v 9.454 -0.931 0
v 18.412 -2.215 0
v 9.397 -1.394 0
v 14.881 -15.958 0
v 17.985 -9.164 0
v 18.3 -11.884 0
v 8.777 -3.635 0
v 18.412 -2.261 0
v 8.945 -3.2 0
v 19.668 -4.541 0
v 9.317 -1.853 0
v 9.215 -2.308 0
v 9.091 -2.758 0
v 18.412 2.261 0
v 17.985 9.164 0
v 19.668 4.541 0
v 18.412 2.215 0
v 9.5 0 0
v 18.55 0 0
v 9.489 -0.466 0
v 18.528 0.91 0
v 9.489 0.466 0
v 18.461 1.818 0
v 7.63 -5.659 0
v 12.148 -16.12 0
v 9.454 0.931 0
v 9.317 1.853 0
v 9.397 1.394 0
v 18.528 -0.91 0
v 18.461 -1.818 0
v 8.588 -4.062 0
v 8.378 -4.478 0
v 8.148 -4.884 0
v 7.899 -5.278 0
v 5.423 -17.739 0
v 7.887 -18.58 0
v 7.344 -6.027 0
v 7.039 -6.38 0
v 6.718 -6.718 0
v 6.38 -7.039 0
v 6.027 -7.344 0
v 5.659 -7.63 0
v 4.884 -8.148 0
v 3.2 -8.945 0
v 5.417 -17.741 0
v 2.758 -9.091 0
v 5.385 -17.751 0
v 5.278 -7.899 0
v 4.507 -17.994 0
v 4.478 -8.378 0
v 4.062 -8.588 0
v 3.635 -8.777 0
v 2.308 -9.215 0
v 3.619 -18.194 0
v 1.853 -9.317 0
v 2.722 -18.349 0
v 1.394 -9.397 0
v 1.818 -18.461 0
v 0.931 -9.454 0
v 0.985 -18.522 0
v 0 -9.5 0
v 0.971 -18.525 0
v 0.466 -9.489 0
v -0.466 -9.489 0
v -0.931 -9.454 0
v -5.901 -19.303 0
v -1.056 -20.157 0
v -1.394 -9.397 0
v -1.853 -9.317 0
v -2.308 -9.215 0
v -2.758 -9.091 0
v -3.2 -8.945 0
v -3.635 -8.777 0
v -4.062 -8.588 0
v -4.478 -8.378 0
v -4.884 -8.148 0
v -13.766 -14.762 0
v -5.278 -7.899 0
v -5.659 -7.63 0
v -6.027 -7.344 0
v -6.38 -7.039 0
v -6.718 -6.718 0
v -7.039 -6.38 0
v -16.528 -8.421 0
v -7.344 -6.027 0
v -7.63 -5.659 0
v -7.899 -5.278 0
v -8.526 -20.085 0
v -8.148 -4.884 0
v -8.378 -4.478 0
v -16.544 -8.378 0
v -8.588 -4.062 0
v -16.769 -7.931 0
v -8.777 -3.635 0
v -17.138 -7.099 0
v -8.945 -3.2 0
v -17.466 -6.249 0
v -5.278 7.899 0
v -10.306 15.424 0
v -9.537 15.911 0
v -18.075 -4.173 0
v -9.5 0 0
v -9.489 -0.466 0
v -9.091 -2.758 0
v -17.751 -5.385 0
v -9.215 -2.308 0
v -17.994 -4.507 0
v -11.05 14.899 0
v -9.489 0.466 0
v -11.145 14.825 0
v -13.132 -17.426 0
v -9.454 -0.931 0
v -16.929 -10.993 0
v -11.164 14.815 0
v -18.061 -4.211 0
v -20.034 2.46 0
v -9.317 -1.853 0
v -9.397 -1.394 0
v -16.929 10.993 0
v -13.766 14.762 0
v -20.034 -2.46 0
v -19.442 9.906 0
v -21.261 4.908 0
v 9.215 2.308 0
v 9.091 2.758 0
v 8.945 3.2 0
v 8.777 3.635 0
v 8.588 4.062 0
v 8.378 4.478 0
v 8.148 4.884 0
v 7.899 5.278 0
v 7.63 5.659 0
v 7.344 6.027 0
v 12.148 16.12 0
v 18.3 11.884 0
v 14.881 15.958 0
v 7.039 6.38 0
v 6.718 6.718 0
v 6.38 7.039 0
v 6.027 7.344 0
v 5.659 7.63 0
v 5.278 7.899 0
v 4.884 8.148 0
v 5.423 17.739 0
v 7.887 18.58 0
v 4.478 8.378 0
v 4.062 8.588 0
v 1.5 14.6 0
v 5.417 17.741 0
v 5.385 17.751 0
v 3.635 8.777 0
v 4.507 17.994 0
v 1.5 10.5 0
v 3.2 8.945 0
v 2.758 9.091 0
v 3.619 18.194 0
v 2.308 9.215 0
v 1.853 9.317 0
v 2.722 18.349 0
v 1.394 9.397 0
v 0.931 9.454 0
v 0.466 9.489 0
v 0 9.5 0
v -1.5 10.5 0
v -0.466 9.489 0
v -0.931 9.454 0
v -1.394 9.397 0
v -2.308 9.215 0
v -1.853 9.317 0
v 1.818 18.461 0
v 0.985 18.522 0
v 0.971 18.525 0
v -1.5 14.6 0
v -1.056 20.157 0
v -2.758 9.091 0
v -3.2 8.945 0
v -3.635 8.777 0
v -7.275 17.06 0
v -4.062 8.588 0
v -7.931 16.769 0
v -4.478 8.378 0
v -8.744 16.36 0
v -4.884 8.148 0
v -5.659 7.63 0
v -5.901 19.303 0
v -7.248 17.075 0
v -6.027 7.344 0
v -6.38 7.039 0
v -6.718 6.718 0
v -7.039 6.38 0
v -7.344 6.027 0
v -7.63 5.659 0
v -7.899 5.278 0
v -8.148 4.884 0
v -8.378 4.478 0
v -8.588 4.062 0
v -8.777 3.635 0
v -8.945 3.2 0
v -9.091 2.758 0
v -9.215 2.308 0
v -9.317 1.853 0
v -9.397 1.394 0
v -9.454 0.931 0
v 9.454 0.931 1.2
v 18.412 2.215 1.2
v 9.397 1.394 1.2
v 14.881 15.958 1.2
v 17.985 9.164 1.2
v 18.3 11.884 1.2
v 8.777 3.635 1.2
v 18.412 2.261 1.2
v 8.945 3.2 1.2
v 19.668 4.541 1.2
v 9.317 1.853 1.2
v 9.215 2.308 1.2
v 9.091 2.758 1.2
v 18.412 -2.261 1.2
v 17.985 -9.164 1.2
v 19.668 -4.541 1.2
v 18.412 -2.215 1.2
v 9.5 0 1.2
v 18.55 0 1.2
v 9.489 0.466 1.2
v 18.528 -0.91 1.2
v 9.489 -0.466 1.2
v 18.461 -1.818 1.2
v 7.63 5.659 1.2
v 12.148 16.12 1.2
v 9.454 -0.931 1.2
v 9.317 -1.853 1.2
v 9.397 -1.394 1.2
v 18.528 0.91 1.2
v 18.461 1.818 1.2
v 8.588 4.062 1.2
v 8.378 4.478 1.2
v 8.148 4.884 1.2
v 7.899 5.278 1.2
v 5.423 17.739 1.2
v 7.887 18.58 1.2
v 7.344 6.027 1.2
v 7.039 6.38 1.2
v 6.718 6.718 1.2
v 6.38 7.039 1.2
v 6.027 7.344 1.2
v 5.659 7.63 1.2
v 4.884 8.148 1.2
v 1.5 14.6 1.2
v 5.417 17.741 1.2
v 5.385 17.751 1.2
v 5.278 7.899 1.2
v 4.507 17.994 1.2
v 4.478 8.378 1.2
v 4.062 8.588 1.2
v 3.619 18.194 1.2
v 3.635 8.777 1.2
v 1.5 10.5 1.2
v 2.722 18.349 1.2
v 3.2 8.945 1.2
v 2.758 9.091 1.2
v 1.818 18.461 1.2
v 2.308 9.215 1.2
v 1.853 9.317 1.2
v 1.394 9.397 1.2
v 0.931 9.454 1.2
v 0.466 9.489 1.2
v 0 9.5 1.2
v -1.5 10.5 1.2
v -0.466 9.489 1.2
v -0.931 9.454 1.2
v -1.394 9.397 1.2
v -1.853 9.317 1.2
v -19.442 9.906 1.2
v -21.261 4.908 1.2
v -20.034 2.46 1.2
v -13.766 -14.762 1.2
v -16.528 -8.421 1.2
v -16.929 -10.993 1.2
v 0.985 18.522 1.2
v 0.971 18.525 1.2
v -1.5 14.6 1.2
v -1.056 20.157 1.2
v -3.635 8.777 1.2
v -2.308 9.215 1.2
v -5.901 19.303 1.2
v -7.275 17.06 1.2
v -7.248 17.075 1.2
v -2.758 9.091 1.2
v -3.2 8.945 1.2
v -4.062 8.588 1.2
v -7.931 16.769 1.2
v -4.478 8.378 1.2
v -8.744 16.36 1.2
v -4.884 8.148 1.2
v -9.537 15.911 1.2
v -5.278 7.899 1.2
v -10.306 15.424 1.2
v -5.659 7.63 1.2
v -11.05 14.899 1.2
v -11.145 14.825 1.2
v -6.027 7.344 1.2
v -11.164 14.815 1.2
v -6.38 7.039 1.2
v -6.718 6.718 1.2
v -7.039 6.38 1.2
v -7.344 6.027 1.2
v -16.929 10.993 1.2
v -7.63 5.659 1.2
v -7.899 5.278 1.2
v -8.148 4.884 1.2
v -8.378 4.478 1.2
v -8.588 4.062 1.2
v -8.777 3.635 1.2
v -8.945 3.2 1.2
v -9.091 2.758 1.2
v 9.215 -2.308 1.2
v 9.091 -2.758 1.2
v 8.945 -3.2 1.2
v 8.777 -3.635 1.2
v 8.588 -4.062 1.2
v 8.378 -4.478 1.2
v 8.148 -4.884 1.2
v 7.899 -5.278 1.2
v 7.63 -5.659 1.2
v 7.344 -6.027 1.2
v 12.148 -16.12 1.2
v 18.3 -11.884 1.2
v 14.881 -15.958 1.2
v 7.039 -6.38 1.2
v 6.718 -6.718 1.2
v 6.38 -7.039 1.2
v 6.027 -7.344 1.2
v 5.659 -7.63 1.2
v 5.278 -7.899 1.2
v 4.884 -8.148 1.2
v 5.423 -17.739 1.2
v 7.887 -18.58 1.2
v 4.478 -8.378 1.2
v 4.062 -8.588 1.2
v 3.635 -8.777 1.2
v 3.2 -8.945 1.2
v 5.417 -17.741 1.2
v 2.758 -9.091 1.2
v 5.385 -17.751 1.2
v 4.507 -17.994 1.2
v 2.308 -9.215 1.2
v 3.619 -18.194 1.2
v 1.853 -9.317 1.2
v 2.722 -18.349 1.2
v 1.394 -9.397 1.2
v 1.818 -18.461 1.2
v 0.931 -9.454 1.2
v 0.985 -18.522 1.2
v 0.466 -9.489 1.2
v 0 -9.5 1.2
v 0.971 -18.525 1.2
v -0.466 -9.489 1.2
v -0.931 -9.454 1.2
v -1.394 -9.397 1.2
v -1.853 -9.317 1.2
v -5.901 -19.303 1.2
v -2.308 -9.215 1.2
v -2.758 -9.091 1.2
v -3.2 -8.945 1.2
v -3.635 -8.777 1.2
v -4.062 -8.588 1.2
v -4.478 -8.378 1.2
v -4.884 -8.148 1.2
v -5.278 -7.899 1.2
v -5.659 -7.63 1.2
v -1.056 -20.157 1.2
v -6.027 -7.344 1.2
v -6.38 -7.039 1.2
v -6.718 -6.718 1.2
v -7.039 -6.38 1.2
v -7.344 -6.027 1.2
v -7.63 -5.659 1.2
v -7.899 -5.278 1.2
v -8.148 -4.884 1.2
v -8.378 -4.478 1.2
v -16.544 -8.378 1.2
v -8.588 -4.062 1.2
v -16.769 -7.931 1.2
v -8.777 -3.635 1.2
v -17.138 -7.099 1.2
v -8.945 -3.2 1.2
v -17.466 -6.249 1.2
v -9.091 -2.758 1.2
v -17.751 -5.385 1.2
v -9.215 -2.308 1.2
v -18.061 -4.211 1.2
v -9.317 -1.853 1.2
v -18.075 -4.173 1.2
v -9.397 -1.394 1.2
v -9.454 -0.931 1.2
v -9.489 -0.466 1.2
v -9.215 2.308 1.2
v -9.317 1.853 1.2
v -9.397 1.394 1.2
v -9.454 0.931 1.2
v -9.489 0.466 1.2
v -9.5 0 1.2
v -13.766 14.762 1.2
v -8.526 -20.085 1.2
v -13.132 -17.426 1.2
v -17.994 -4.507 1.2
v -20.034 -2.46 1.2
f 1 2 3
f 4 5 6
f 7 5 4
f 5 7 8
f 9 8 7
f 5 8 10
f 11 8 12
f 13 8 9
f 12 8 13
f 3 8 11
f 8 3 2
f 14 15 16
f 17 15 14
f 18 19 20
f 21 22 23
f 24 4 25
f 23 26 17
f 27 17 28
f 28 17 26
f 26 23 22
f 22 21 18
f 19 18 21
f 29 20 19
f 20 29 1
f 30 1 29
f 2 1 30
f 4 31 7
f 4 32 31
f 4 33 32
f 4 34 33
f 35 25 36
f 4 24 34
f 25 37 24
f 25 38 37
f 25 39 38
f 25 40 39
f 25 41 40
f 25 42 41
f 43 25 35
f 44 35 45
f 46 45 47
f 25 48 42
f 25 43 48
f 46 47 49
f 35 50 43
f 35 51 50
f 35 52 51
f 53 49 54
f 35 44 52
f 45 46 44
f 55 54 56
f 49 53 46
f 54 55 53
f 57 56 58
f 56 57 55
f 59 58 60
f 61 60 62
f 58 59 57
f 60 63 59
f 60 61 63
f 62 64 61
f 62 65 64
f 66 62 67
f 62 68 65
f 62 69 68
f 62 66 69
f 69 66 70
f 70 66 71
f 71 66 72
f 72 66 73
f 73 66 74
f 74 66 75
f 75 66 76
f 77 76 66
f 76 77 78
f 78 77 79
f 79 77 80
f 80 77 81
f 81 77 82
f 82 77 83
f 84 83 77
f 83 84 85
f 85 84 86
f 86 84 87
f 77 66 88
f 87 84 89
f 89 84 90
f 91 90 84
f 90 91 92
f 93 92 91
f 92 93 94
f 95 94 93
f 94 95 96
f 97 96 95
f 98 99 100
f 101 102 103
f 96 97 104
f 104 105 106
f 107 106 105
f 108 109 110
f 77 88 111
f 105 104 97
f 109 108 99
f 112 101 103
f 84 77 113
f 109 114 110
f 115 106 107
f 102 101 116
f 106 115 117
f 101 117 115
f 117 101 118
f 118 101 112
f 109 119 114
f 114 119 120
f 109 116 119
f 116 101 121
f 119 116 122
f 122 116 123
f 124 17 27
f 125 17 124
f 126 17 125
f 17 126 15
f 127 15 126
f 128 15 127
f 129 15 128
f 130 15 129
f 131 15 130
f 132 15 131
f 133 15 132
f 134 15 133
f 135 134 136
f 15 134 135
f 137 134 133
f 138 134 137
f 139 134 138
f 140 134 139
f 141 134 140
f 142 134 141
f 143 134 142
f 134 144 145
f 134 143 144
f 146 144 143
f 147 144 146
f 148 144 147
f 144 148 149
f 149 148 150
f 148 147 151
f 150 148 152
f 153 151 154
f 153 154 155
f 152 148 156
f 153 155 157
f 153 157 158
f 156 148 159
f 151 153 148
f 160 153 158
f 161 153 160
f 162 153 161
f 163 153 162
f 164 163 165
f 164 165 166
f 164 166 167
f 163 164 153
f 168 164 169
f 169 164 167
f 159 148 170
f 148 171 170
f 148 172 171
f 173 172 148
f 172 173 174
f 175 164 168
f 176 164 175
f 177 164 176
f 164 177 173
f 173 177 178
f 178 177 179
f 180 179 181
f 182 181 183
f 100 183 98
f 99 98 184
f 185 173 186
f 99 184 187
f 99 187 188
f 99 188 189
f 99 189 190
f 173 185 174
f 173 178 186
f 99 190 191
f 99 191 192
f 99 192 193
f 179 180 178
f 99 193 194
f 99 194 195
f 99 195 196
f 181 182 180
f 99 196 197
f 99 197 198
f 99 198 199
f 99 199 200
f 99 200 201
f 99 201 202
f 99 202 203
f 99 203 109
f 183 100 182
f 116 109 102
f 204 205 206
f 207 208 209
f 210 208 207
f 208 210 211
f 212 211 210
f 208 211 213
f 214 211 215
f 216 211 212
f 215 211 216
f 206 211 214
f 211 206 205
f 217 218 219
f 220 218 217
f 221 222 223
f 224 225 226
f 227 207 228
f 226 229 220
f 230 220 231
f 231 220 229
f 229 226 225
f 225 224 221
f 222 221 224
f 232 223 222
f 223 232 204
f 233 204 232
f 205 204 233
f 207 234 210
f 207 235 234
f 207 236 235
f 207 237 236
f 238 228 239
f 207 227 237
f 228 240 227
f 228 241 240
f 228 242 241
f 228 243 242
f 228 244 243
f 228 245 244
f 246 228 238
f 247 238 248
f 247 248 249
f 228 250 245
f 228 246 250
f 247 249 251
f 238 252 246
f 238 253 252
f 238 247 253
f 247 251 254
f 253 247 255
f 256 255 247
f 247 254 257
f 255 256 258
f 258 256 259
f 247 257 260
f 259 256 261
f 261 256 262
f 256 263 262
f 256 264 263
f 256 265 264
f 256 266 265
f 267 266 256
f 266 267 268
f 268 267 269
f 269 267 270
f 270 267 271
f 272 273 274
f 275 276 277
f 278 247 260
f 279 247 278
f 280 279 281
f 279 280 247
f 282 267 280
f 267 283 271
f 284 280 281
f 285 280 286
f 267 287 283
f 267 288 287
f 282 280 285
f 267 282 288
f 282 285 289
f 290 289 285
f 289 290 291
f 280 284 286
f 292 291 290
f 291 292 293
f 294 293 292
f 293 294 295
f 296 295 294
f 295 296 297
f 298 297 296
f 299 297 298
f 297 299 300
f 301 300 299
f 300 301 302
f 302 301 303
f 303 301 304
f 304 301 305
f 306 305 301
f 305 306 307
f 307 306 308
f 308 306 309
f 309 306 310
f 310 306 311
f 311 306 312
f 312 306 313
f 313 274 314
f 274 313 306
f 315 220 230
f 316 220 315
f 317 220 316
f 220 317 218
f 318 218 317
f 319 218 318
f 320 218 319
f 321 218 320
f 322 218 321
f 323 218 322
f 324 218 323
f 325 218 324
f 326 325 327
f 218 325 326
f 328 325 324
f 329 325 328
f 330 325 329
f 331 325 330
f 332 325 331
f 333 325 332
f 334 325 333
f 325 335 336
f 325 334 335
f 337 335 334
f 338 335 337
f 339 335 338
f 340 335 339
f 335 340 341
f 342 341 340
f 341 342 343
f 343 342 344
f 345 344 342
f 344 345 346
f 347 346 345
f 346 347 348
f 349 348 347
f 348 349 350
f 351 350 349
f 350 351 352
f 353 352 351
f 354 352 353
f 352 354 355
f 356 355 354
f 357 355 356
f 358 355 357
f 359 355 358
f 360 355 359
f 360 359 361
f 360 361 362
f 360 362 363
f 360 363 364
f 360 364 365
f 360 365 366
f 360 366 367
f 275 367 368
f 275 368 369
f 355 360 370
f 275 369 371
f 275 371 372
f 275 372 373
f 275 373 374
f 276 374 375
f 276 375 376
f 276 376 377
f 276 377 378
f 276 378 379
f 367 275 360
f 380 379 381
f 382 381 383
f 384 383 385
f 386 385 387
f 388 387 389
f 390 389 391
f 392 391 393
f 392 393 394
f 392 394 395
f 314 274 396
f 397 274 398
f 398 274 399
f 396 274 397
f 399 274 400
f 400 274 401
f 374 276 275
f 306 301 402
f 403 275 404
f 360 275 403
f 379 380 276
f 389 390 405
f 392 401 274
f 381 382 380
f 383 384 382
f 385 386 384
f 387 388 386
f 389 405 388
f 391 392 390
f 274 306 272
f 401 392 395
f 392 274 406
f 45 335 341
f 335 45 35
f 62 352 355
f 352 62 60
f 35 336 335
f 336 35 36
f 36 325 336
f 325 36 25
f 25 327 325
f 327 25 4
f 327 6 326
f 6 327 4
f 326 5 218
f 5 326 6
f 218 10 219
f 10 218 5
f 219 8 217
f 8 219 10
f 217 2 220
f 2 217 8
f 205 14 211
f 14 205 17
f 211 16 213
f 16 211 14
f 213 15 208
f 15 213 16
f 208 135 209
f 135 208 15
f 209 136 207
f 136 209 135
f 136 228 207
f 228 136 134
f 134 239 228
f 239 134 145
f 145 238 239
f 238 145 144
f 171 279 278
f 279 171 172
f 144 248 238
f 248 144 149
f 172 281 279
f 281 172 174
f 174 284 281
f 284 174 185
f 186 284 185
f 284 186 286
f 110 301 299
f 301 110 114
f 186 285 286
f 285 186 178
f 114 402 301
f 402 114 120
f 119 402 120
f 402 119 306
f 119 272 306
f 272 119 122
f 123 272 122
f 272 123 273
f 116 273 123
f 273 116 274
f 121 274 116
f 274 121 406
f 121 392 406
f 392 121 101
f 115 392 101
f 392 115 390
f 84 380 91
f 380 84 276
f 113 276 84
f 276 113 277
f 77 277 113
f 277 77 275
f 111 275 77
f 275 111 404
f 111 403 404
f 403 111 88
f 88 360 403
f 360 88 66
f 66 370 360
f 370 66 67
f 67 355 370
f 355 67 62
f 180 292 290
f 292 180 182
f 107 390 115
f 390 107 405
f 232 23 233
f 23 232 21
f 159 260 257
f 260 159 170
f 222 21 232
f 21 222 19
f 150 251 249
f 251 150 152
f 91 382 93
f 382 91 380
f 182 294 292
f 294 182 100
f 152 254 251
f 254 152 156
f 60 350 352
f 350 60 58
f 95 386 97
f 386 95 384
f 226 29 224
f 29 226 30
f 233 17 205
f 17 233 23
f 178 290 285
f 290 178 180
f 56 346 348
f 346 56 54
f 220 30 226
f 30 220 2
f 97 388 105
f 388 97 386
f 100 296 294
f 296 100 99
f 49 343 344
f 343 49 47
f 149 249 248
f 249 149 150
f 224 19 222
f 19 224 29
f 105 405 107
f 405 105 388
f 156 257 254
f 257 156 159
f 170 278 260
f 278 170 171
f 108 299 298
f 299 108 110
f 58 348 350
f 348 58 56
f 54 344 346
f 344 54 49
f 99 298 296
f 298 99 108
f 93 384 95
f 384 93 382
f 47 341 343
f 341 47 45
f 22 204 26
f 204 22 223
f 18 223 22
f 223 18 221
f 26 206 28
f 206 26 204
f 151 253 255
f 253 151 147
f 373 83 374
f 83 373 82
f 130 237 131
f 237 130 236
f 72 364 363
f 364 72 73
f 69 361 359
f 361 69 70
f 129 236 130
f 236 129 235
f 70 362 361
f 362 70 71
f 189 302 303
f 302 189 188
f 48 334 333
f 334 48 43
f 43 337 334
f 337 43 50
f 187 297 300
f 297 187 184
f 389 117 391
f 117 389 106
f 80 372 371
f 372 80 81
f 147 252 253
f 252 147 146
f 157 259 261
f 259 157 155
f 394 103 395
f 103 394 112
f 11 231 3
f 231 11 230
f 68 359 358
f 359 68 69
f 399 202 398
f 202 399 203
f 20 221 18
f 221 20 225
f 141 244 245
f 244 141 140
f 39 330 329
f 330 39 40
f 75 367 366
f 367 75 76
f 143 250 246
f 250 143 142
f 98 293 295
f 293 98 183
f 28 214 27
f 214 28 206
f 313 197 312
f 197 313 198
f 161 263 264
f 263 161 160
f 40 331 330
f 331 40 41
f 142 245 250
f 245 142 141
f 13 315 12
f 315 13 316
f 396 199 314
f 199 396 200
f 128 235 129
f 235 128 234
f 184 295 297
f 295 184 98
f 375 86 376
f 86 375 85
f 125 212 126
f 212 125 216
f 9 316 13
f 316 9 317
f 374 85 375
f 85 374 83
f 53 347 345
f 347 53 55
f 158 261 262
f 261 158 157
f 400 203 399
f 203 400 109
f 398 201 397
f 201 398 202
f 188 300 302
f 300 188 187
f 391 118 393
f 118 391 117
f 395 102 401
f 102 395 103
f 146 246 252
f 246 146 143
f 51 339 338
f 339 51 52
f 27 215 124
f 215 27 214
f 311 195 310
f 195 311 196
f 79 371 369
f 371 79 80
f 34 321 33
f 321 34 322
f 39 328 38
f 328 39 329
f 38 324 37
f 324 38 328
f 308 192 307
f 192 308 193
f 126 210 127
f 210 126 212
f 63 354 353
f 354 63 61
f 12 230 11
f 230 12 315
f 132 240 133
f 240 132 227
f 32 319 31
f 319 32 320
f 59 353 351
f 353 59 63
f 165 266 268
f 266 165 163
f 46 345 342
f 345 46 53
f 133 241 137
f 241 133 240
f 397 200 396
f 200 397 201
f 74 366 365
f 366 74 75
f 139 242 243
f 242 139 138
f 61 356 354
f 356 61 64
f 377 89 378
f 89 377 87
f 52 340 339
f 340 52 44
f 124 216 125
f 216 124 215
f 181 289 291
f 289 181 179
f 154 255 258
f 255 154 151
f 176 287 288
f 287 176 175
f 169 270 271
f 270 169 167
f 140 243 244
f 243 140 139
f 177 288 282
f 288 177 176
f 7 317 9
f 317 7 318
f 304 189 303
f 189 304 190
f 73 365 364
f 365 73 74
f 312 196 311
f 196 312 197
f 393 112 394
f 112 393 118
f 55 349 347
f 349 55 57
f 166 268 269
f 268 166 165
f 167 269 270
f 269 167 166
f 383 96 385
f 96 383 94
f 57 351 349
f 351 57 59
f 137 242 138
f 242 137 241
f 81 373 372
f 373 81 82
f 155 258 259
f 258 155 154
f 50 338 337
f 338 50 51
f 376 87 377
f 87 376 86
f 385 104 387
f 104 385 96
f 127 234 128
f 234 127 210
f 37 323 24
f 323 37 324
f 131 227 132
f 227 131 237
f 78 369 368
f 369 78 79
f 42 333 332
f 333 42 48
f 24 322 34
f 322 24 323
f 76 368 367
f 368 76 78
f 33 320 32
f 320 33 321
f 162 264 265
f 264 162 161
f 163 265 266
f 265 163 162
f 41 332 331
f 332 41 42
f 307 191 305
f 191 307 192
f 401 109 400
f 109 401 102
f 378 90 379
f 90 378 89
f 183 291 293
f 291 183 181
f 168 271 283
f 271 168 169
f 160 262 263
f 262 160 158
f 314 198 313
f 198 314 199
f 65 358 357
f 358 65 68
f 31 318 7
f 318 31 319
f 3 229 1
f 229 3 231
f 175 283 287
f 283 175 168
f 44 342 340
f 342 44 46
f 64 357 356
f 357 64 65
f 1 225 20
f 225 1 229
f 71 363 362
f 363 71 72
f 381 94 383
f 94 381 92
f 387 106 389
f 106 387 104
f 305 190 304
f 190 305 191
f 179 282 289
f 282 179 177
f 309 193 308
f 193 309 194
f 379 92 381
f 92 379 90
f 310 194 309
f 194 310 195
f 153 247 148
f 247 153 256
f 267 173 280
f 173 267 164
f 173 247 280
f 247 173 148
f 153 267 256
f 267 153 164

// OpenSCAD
/*
  Elna Supermatic cam 15
  Name: Triangle
  Status: candidate

  Generated from measured parametric base v2.
  Surface mode: stepped
*/

include <_elna_measured_common.scad>;

profile_points = [
        [0.9708, 18.5246],
        [5.4235, 17.7395],
        [7.8869, 18.5804],
        [12.1476, 16.1205],
        [14.8812, 15.9581],
        [18.2998, 11.8840],
        [17.9850, 9.1638],
        [19.6677, 4.5406],
        [18.4117, 2.2607],
        [18.4117, -2.2607],
        [19.6677, -4.5406],
        [17.9850, -9.1638],
        [18.2998, -11.8840],
        [14.8812, -15.9581],
        [12.1476, -16.1205],
        [7.8869, -18.5804],
        [5.4235, -17.7395],
        [0.9708, -18.5246],
        [-1.0564, -20.1573],
        [-5.9015, -19.3030],
        [-8.5258, -20.0854],
        [-13.1316, -17.4262],
        [-13.7661, -14.7624],
        [-16.9286, -10.9935],
        [-16.5282, -8.4215],
        [-18.0746, -4.1728],
        [-20.0345, -2.4599],
        [-20.0345, 2.4599],
        [-21.2608, 4.9084],
        [-19.4418, 9.9061],
        [-16.9286, 10.9935],
        [-13.7661, 14.7624],
        [-11.1637, 14.8147],
        [-7.2481, 17.0754],
        [-5.9015, 19.3030],
        [-1.0564, 20.1573]
];

icon_points = [[-1.000,0.180], [-0.750,0.820], [-0.500,0.180], [-0.250,0.820], [0.000,0.180], [0.250,0.820], [0.500,0.180], [0.750,0.820], [1.000,0.180]];

elna_cam_ring(profile_points=profile_points);
